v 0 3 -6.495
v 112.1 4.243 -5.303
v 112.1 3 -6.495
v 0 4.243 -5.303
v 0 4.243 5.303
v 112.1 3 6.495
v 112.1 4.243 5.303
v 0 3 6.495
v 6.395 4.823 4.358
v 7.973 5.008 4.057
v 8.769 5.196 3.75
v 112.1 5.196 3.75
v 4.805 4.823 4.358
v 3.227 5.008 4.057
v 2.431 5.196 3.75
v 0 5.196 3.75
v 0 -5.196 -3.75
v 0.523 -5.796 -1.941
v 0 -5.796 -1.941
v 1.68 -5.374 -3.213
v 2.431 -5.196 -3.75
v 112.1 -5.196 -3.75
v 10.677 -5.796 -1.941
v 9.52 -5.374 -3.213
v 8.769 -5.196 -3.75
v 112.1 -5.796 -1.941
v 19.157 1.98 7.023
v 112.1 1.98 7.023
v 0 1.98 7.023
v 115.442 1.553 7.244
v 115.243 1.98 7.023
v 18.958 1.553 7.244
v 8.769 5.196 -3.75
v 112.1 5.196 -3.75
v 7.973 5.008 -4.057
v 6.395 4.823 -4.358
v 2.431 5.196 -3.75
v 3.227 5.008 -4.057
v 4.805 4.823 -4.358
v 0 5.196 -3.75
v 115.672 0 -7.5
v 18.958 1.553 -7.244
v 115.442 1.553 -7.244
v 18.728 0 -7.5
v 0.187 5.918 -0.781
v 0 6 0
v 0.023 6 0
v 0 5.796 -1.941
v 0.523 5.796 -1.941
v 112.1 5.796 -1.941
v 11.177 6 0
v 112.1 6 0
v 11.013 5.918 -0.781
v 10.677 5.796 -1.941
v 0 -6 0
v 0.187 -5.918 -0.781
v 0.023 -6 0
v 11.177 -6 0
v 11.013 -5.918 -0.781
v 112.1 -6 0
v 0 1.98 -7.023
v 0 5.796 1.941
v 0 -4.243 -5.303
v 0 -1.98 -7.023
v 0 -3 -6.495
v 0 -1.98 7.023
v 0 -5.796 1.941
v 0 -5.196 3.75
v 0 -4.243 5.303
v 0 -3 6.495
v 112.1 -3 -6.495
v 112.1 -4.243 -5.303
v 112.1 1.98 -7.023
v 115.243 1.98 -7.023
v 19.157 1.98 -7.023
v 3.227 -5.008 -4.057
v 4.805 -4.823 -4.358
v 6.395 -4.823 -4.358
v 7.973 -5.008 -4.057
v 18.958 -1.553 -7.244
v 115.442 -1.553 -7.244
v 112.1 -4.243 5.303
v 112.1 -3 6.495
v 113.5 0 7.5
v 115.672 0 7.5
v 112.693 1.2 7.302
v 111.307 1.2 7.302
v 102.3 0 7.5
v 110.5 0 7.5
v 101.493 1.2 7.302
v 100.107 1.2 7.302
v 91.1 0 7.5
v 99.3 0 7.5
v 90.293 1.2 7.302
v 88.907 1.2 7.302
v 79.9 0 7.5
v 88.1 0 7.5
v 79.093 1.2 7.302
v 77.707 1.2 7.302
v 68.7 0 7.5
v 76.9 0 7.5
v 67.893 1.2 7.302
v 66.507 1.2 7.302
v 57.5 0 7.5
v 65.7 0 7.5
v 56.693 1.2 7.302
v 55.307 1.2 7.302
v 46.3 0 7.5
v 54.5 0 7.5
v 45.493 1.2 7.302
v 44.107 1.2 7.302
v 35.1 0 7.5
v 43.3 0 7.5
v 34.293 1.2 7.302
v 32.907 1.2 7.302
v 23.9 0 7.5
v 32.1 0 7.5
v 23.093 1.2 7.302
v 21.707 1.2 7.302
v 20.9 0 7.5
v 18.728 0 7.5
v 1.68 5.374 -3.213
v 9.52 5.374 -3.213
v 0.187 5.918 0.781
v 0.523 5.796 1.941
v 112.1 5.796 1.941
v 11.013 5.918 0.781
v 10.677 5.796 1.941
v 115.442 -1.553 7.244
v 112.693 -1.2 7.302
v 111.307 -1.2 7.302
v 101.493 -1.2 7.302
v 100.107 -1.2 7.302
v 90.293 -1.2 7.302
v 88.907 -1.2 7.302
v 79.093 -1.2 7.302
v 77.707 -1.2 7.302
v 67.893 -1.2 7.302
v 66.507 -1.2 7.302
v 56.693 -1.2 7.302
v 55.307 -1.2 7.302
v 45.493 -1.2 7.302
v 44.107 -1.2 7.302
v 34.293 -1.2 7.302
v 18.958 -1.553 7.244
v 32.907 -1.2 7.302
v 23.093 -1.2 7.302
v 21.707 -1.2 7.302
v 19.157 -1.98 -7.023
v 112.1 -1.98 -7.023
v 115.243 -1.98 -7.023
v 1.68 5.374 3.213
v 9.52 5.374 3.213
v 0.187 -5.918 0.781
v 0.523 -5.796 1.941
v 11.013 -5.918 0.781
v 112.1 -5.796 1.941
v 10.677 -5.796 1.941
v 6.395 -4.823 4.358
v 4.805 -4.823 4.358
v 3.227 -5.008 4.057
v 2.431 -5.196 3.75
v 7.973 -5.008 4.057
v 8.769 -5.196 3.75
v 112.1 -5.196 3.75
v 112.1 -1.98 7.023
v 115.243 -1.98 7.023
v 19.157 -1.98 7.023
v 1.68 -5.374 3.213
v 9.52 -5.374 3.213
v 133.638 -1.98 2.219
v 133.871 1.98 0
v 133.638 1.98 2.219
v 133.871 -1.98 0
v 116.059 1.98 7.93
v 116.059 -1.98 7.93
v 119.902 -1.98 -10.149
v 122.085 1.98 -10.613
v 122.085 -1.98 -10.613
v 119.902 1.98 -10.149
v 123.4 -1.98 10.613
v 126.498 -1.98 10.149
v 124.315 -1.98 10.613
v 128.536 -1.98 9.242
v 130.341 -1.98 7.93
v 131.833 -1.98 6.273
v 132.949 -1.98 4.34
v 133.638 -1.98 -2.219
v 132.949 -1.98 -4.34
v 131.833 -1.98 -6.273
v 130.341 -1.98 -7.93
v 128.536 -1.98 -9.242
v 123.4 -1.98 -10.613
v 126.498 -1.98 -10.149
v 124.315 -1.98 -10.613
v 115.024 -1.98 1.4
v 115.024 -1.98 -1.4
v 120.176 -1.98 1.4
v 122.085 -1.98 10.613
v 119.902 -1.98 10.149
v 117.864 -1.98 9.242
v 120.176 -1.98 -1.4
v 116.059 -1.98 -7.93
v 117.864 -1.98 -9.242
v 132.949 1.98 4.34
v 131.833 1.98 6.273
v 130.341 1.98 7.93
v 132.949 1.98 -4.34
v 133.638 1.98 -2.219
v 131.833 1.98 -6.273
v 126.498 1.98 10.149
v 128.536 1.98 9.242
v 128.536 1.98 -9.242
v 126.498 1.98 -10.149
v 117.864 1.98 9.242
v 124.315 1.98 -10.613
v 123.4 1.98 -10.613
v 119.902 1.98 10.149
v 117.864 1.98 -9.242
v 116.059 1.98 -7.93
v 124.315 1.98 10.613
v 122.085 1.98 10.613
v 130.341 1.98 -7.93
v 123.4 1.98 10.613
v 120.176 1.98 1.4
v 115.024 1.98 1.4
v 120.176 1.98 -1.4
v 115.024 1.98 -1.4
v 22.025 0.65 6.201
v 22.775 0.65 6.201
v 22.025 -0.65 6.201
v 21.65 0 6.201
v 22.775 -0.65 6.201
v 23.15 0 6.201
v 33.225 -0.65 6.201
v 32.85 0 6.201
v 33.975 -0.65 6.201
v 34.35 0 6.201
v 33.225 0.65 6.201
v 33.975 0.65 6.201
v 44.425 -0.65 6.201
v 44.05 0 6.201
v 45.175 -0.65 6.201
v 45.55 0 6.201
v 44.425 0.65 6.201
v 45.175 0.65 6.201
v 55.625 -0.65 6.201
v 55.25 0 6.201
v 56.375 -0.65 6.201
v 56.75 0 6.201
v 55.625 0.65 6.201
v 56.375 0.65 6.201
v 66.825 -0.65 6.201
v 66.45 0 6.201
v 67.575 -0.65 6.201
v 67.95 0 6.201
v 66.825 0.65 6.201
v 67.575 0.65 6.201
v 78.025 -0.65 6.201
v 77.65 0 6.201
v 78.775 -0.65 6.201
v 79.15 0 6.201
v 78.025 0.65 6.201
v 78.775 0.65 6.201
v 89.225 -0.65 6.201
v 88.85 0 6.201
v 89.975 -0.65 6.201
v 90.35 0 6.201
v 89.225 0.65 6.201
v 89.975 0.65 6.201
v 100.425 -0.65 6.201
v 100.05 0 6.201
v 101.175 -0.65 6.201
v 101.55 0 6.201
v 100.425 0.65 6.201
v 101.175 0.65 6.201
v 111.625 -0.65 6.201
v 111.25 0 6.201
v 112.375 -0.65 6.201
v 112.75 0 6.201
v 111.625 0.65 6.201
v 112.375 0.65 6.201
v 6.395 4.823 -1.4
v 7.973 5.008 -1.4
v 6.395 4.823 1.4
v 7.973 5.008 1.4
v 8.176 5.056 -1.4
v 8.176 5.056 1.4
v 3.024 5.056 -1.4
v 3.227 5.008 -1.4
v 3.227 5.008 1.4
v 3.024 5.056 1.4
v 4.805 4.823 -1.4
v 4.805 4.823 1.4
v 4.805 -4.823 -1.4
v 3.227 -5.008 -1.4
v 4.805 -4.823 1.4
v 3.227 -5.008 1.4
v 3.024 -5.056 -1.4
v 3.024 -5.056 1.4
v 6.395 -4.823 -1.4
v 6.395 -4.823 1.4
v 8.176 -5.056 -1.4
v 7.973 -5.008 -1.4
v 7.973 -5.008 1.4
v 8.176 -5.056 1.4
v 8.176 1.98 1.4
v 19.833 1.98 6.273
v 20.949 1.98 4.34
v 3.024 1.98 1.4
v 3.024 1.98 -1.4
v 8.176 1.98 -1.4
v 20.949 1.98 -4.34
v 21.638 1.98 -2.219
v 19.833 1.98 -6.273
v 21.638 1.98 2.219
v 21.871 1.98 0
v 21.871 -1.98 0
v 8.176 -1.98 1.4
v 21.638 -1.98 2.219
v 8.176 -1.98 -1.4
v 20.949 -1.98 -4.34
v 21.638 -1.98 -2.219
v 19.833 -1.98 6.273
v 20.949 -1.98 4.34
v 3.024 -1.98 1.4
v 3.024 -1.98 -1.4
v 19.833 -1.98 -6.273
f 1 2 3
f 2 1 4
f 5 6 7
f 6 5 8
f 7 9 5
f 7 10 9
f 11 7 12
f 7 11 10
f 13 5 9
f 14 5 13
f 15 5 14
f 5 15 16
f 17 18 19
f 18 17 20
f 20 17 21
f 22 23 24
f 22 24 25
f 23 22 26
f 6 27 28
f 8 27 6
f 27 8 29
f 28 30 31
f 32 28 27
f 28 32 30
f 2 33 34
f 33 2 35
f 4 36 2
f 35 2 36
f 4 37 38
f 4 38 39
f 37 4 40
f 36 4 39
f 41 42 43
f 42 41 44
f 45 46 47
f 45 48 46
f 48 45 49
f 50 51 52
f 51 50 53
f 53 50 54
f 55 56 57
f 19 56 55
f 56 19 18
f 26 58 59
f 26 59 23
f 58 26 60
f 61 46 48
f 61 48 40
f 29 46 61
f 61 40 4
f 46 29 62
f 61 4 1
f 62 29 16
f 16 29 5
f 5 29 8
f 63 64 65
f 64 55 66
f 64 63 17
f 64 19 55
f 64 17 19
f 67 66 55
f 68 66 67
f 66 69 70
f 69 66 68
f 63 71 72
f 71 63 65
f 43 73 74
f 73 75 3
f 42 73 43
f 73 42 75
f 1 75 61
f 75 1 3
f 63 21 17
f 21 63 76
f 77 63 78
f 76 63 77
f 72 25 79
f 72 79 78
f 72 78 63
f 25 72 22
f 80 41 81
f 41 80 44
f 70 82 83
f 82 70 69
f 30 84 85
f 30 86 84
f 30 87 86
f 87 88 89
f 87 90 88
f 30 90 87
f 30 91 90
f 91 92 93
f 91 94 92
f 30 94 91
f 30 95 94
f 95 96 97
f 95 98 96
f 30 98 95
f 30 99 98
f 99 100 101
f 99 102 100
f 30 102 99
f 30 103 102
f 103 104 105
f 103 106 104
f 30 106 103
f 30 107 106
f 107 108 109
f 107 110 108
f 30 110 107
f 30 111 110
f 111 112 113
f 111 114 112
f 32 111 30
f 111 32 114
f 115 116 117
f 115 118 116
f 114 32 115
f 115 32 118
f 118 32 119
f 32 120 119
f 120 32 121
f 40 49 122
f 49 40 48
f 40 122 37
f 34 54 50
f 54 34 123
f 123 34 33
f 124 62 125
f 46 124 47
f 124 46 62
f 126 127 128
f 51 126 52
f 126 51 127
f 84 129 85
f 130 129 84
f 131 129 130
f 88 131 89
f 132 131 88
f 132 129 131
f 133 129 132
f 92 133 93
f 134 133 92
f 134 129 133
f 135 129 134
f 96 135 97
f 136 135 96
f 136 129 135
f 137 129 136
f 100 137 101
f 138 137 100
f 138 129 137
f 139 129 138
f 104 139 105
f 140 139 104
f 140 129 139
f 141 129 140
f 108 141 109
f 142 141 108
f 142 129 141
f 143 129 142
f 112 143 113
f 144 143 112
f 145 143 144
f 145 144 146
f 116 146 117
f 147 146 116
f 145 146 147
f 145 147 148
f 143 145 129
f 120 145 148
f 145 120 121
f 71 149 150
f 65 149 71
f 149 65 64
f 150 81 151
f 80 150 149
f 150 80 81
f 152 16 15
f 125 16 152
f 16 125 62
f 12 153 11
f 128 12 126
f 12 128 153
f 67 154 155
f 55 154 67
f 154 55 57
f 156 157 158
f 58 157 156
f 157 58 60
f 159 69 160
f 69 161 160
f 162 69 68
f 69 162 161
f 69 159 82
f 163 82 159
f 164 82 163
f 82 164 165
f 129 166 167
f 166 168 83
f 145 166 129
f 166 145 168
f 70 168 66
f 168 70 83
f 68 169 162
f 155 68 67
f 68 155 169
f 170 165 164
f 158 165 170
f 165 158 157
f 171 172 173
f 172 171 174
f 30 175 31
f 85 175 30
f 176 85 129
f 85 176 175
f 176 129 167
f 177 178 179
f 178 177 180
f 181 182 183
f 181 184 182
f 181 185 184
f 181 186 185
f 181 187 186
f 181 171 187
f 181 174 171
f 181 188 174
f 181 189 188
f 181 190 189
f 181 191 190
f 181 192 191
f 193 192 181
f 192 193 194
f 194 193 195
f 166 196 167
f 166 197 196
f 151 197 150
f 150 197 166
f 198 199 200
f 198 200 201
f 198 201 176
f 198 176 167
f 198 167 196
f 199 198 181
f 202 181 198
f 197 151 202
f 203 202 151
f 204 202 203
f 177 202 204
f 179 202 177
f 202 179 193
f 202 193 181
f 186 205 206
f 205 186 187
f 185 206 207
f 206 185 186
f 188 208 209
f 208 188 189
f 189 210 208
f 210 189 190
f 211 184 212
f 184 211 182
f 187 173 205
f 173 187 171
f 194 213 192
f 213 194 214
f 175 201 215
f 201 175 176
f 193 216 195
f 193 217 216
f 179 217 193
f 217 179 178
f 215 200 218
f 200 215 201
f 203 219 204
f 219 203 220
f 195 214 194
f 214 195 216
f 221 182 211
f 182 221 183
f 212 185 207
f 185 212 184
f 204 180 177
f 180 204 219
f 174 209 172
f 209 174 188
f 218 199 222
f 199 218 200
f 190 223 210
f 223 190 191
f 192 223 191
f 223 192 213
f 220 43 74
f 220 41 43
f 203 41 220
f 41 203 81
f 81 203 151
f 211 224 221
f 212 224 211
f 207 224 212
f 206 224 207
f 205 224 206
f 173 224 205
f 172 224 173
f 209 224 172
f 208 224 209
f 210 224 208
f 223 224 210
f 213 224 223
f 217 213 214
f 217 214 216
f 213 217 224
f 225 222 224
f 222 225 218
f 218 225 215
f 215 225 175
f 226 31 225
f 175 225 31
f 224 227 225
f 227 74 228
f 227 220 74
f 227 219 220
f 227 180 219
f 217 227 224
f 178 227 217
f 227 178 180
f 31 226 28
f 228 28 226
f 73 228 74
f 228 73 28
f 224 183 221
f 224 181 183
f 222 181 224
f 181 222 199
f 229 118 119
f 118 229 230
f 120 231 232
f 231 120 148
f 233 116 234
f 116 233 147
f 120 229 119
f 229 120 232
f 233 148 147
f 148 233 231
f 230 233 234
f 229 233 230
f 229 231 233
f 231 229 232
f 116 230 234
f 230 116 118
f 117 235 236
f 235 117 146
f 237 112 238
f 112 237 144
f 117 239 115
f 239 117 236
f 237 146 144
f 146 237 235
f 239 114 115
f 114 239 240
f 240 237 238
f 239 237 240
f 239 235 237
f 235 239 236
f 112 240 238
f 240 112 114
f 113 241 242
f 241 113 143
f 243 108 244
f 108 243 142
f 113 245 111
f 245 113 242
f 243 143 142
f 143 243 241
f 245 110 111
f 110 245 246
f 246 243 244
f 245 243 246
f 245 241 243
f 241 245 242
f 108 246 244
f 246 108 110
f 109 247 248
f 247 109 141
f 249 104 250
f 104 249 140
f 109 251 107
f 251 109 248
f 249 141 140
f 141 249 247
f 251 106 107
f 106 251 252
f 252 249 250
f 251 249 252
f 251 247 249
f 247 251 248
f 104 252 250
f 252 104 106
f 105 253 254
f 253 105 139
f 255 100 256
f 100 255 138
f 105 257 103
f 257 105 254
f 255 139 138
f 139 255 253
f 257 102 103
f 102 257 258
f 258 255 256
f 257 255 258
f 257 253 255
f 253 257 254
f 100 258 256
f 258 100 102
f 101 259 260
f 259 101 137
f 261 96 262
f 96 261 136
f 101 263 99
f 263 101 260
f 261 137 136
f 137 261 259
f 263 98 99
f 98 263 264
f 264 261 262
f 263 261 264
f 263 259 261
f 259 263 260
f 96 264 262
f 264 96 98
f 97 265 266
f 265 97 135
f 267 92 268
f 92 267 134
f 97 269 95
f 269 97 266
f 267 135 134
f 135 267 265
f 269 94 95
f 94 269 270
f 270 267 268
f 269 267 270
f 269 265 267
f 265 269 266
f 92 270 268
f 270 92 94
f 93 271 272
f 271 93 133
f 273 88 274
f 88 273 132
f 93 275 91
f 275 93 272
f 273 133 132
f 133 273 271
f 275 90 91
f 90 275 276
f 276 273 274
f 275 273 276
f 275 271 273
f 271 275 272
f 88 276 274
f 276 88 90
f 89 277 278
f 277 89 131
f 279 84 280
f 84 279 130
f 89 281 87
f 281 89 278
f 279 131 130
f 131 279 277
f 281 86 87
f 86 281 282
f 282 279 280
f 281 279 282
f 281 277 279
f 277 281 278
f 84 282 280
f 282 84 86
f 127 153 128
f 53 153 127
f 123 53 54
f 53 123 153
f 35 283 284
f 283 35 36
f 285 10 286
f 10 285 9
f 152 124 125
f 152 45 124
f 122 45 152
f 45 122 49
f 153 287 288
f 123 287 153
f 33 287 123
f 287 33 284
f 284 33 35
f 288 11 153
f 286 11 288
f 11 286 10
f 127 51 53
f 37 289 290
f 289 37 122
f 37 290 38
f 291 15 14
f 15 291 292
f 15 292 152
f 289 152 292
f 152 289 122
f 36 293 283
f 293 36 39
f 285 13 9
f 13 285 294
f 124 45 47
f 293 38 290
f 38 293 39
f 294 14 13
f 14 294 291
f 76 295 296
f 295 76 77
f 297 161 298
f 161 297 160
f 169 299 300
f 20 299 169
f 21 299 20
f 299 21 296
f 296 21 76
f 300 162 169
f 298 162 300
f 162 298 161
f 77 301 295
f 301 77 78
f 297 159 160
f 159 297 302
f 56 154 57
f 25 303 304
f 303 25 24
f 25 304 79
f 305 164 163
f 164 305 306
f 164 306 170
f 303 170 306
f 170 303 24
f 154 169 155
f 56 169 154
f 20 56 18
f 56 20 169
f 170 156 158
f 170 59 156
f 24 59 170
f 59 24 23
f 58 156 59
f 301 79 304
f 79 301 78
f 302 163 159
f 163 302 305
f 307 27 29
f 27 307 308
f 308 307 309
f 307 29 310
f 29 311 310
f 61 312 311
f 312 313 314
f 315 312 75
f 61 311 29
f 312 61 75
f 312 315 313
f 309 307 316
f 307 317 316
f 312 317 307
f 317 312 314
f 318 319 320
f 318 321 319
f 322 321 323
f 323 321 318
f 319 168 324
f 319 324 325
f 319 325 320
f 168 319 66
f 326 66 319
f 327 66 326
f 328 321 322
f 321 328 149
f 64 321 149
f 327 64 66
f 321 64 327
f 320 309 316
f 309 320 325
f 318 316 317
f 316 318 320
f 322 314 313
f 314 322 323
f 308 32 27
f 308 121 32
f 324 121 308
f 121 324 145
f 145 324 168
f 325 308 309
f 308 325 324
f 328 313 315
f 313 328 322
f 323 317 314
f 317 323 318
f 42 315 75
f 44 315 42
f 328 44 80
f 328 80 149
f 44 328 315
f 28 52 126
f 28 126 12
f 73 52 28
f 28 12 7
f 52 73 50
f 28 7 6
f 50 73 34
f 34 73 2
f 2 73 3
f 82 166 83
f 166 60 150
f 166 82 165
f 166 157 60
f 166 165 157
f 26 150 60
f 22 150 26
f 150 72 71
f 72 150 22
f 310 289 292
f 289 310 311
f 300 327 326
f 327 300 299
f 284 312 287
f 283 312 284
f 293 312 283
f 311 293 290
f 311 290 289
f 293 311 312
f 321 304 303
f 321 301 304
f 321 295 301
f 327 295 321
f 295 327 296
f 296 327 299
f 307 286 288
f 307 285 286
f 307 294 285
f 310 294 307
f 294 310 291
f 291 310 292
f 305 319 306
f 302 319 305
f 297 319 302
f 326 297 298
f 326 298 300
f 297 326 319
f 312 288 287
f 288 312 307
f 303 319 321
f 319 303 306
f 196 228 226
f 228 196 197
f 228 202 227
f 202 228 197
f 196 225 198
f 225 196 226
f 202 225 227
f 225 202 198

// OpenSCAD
u = 11.2;
p = 12;
h = 0.1 * p;
tenon_to_p = .33;
OVERLAP = 0.1;
OVER_HEIGHT = p * 3;
UNDER_HEIGHT = -p;
BACK_HEIGHT = -p;
center_tenon_thickness = tenon_to_p * p;
side_tenon_thickness = (1 - tenon_to_p) / 2 * p;
unit_length = 11;
length = unit_length * u;
z_scale = 1.25;
height = z_scale * p;
sphere_size = 1.5;
peg_dia_to_u = 0.4;
peg_r = peg_dia_to_u * u / 2;
peg_scale = 2.3;
expected_layer_height = 1;
end_curve_to_unit_length = 0.28;
end_curve_belly = end_curve_to_unit_length * unit_length;

function fnFromRadius(r) = (r / expected_layer_height) * 4;


function radFromChordHeight(chordLength, chordHeight) = (((chordLength * chordLength) / (chordHeight * 8))) + (chordHeight / 2);

rad = radFromChordHeight(u, h);
post_reference_location = [u / 2, -BACK_HEIGHT, 0];
post_back_reference_location = [length - (u / 2), -BACK_HEIGHT, 0];
echo(rad);
end_curve_rad = radFromChordHeight(height, end_curve_belly);

module lock_scale() {
    scale([1, 1, z_scale]) children();
}

module post_orientation() {
    rotate([0, 90, 0]) children();
}

module peg_orientation() {
    rotate([90, 0, 0]) children();
}

module post() {
  difference() {
      union() {
    lock_scale() post_orientation() cylinder(length, d=p, $fn=fnFromRadius(p / 2));
          translate([length, center_tenon_thickness / 2, 0]) round_end();
      }
          translate([u / 2, (rad + p / 2) - h, UNDER_HEIGHT]) cylinder(abs(UNDER_HEIGHT) * 2, r=rad, $fn=fnFromRadius(rad));
    translate([u / 2, -(rad + p / 2) + h, UNDER_HEIGHT]) cylinder(abs(UNDER_HEIGHT) * 2, r=rad, $fn=fnFromRadius(rad));
    for (i=[0:unit_length - 1]) {
        translate([i * u, 0, height / 2]) #sphere(sphere_size, $fn=fnFromRadius(sphere_size));
    }
  }
}

module tenoned_post() {
    difference() {
        post();
        #translate([-OVERLAP, -0.5 * p * tenon_to_p, -OVER_HEIGHT / 2]) center_block();
        translate([OVERLAP + length - u, center_tenon_thickness / 2, UNDER_HEIGHT]) side_block();
        translate([OVERLAP + length - u, - (center_tenon_thickness / 2 + side_tenon_thickness), UNDER_HEIGHT]) side_block();
    }
}

module peg() {
    intersection() {
        post();
        translate(post_reference_location) peg_stock();
    }
}
  
module round_end() {
    rotate([90, 0, 0]) cylinder(center_tenon_thickness, r=end_curve_rad);
}

module center_block() {
    union() {
    cube([u + OVERLAP, center_tenon_thickness, OVER_HEIGHT]);
        #translate([u + OVERLAP, center_tenon_thickness, OVER_HEIGHT / 2]) 
        round_end();
    }
}

module side_block() {
    cube([u + OVERLAP, side_tenon_thickness, OVER_HEIGHT]);
}

module peg_translation() {
    translate([-peg_r * peg_scale / 2, -peg_r / 2]) children();
}

module peg_stock(length=0) {
    lock_scale() peg_orientation() peg_translation() cube([peg_r * peg_scale, peg_r, length == 0 ? abs(BACK_HEIGHT) * 2 : length]);
}

module handle() {
difference() {
    tenoned_post();
    #translate(post_reference_location) peg_stock();
    #translate(post_back_reference_location) peg_stock();
}
}

handle();
//center_block();
